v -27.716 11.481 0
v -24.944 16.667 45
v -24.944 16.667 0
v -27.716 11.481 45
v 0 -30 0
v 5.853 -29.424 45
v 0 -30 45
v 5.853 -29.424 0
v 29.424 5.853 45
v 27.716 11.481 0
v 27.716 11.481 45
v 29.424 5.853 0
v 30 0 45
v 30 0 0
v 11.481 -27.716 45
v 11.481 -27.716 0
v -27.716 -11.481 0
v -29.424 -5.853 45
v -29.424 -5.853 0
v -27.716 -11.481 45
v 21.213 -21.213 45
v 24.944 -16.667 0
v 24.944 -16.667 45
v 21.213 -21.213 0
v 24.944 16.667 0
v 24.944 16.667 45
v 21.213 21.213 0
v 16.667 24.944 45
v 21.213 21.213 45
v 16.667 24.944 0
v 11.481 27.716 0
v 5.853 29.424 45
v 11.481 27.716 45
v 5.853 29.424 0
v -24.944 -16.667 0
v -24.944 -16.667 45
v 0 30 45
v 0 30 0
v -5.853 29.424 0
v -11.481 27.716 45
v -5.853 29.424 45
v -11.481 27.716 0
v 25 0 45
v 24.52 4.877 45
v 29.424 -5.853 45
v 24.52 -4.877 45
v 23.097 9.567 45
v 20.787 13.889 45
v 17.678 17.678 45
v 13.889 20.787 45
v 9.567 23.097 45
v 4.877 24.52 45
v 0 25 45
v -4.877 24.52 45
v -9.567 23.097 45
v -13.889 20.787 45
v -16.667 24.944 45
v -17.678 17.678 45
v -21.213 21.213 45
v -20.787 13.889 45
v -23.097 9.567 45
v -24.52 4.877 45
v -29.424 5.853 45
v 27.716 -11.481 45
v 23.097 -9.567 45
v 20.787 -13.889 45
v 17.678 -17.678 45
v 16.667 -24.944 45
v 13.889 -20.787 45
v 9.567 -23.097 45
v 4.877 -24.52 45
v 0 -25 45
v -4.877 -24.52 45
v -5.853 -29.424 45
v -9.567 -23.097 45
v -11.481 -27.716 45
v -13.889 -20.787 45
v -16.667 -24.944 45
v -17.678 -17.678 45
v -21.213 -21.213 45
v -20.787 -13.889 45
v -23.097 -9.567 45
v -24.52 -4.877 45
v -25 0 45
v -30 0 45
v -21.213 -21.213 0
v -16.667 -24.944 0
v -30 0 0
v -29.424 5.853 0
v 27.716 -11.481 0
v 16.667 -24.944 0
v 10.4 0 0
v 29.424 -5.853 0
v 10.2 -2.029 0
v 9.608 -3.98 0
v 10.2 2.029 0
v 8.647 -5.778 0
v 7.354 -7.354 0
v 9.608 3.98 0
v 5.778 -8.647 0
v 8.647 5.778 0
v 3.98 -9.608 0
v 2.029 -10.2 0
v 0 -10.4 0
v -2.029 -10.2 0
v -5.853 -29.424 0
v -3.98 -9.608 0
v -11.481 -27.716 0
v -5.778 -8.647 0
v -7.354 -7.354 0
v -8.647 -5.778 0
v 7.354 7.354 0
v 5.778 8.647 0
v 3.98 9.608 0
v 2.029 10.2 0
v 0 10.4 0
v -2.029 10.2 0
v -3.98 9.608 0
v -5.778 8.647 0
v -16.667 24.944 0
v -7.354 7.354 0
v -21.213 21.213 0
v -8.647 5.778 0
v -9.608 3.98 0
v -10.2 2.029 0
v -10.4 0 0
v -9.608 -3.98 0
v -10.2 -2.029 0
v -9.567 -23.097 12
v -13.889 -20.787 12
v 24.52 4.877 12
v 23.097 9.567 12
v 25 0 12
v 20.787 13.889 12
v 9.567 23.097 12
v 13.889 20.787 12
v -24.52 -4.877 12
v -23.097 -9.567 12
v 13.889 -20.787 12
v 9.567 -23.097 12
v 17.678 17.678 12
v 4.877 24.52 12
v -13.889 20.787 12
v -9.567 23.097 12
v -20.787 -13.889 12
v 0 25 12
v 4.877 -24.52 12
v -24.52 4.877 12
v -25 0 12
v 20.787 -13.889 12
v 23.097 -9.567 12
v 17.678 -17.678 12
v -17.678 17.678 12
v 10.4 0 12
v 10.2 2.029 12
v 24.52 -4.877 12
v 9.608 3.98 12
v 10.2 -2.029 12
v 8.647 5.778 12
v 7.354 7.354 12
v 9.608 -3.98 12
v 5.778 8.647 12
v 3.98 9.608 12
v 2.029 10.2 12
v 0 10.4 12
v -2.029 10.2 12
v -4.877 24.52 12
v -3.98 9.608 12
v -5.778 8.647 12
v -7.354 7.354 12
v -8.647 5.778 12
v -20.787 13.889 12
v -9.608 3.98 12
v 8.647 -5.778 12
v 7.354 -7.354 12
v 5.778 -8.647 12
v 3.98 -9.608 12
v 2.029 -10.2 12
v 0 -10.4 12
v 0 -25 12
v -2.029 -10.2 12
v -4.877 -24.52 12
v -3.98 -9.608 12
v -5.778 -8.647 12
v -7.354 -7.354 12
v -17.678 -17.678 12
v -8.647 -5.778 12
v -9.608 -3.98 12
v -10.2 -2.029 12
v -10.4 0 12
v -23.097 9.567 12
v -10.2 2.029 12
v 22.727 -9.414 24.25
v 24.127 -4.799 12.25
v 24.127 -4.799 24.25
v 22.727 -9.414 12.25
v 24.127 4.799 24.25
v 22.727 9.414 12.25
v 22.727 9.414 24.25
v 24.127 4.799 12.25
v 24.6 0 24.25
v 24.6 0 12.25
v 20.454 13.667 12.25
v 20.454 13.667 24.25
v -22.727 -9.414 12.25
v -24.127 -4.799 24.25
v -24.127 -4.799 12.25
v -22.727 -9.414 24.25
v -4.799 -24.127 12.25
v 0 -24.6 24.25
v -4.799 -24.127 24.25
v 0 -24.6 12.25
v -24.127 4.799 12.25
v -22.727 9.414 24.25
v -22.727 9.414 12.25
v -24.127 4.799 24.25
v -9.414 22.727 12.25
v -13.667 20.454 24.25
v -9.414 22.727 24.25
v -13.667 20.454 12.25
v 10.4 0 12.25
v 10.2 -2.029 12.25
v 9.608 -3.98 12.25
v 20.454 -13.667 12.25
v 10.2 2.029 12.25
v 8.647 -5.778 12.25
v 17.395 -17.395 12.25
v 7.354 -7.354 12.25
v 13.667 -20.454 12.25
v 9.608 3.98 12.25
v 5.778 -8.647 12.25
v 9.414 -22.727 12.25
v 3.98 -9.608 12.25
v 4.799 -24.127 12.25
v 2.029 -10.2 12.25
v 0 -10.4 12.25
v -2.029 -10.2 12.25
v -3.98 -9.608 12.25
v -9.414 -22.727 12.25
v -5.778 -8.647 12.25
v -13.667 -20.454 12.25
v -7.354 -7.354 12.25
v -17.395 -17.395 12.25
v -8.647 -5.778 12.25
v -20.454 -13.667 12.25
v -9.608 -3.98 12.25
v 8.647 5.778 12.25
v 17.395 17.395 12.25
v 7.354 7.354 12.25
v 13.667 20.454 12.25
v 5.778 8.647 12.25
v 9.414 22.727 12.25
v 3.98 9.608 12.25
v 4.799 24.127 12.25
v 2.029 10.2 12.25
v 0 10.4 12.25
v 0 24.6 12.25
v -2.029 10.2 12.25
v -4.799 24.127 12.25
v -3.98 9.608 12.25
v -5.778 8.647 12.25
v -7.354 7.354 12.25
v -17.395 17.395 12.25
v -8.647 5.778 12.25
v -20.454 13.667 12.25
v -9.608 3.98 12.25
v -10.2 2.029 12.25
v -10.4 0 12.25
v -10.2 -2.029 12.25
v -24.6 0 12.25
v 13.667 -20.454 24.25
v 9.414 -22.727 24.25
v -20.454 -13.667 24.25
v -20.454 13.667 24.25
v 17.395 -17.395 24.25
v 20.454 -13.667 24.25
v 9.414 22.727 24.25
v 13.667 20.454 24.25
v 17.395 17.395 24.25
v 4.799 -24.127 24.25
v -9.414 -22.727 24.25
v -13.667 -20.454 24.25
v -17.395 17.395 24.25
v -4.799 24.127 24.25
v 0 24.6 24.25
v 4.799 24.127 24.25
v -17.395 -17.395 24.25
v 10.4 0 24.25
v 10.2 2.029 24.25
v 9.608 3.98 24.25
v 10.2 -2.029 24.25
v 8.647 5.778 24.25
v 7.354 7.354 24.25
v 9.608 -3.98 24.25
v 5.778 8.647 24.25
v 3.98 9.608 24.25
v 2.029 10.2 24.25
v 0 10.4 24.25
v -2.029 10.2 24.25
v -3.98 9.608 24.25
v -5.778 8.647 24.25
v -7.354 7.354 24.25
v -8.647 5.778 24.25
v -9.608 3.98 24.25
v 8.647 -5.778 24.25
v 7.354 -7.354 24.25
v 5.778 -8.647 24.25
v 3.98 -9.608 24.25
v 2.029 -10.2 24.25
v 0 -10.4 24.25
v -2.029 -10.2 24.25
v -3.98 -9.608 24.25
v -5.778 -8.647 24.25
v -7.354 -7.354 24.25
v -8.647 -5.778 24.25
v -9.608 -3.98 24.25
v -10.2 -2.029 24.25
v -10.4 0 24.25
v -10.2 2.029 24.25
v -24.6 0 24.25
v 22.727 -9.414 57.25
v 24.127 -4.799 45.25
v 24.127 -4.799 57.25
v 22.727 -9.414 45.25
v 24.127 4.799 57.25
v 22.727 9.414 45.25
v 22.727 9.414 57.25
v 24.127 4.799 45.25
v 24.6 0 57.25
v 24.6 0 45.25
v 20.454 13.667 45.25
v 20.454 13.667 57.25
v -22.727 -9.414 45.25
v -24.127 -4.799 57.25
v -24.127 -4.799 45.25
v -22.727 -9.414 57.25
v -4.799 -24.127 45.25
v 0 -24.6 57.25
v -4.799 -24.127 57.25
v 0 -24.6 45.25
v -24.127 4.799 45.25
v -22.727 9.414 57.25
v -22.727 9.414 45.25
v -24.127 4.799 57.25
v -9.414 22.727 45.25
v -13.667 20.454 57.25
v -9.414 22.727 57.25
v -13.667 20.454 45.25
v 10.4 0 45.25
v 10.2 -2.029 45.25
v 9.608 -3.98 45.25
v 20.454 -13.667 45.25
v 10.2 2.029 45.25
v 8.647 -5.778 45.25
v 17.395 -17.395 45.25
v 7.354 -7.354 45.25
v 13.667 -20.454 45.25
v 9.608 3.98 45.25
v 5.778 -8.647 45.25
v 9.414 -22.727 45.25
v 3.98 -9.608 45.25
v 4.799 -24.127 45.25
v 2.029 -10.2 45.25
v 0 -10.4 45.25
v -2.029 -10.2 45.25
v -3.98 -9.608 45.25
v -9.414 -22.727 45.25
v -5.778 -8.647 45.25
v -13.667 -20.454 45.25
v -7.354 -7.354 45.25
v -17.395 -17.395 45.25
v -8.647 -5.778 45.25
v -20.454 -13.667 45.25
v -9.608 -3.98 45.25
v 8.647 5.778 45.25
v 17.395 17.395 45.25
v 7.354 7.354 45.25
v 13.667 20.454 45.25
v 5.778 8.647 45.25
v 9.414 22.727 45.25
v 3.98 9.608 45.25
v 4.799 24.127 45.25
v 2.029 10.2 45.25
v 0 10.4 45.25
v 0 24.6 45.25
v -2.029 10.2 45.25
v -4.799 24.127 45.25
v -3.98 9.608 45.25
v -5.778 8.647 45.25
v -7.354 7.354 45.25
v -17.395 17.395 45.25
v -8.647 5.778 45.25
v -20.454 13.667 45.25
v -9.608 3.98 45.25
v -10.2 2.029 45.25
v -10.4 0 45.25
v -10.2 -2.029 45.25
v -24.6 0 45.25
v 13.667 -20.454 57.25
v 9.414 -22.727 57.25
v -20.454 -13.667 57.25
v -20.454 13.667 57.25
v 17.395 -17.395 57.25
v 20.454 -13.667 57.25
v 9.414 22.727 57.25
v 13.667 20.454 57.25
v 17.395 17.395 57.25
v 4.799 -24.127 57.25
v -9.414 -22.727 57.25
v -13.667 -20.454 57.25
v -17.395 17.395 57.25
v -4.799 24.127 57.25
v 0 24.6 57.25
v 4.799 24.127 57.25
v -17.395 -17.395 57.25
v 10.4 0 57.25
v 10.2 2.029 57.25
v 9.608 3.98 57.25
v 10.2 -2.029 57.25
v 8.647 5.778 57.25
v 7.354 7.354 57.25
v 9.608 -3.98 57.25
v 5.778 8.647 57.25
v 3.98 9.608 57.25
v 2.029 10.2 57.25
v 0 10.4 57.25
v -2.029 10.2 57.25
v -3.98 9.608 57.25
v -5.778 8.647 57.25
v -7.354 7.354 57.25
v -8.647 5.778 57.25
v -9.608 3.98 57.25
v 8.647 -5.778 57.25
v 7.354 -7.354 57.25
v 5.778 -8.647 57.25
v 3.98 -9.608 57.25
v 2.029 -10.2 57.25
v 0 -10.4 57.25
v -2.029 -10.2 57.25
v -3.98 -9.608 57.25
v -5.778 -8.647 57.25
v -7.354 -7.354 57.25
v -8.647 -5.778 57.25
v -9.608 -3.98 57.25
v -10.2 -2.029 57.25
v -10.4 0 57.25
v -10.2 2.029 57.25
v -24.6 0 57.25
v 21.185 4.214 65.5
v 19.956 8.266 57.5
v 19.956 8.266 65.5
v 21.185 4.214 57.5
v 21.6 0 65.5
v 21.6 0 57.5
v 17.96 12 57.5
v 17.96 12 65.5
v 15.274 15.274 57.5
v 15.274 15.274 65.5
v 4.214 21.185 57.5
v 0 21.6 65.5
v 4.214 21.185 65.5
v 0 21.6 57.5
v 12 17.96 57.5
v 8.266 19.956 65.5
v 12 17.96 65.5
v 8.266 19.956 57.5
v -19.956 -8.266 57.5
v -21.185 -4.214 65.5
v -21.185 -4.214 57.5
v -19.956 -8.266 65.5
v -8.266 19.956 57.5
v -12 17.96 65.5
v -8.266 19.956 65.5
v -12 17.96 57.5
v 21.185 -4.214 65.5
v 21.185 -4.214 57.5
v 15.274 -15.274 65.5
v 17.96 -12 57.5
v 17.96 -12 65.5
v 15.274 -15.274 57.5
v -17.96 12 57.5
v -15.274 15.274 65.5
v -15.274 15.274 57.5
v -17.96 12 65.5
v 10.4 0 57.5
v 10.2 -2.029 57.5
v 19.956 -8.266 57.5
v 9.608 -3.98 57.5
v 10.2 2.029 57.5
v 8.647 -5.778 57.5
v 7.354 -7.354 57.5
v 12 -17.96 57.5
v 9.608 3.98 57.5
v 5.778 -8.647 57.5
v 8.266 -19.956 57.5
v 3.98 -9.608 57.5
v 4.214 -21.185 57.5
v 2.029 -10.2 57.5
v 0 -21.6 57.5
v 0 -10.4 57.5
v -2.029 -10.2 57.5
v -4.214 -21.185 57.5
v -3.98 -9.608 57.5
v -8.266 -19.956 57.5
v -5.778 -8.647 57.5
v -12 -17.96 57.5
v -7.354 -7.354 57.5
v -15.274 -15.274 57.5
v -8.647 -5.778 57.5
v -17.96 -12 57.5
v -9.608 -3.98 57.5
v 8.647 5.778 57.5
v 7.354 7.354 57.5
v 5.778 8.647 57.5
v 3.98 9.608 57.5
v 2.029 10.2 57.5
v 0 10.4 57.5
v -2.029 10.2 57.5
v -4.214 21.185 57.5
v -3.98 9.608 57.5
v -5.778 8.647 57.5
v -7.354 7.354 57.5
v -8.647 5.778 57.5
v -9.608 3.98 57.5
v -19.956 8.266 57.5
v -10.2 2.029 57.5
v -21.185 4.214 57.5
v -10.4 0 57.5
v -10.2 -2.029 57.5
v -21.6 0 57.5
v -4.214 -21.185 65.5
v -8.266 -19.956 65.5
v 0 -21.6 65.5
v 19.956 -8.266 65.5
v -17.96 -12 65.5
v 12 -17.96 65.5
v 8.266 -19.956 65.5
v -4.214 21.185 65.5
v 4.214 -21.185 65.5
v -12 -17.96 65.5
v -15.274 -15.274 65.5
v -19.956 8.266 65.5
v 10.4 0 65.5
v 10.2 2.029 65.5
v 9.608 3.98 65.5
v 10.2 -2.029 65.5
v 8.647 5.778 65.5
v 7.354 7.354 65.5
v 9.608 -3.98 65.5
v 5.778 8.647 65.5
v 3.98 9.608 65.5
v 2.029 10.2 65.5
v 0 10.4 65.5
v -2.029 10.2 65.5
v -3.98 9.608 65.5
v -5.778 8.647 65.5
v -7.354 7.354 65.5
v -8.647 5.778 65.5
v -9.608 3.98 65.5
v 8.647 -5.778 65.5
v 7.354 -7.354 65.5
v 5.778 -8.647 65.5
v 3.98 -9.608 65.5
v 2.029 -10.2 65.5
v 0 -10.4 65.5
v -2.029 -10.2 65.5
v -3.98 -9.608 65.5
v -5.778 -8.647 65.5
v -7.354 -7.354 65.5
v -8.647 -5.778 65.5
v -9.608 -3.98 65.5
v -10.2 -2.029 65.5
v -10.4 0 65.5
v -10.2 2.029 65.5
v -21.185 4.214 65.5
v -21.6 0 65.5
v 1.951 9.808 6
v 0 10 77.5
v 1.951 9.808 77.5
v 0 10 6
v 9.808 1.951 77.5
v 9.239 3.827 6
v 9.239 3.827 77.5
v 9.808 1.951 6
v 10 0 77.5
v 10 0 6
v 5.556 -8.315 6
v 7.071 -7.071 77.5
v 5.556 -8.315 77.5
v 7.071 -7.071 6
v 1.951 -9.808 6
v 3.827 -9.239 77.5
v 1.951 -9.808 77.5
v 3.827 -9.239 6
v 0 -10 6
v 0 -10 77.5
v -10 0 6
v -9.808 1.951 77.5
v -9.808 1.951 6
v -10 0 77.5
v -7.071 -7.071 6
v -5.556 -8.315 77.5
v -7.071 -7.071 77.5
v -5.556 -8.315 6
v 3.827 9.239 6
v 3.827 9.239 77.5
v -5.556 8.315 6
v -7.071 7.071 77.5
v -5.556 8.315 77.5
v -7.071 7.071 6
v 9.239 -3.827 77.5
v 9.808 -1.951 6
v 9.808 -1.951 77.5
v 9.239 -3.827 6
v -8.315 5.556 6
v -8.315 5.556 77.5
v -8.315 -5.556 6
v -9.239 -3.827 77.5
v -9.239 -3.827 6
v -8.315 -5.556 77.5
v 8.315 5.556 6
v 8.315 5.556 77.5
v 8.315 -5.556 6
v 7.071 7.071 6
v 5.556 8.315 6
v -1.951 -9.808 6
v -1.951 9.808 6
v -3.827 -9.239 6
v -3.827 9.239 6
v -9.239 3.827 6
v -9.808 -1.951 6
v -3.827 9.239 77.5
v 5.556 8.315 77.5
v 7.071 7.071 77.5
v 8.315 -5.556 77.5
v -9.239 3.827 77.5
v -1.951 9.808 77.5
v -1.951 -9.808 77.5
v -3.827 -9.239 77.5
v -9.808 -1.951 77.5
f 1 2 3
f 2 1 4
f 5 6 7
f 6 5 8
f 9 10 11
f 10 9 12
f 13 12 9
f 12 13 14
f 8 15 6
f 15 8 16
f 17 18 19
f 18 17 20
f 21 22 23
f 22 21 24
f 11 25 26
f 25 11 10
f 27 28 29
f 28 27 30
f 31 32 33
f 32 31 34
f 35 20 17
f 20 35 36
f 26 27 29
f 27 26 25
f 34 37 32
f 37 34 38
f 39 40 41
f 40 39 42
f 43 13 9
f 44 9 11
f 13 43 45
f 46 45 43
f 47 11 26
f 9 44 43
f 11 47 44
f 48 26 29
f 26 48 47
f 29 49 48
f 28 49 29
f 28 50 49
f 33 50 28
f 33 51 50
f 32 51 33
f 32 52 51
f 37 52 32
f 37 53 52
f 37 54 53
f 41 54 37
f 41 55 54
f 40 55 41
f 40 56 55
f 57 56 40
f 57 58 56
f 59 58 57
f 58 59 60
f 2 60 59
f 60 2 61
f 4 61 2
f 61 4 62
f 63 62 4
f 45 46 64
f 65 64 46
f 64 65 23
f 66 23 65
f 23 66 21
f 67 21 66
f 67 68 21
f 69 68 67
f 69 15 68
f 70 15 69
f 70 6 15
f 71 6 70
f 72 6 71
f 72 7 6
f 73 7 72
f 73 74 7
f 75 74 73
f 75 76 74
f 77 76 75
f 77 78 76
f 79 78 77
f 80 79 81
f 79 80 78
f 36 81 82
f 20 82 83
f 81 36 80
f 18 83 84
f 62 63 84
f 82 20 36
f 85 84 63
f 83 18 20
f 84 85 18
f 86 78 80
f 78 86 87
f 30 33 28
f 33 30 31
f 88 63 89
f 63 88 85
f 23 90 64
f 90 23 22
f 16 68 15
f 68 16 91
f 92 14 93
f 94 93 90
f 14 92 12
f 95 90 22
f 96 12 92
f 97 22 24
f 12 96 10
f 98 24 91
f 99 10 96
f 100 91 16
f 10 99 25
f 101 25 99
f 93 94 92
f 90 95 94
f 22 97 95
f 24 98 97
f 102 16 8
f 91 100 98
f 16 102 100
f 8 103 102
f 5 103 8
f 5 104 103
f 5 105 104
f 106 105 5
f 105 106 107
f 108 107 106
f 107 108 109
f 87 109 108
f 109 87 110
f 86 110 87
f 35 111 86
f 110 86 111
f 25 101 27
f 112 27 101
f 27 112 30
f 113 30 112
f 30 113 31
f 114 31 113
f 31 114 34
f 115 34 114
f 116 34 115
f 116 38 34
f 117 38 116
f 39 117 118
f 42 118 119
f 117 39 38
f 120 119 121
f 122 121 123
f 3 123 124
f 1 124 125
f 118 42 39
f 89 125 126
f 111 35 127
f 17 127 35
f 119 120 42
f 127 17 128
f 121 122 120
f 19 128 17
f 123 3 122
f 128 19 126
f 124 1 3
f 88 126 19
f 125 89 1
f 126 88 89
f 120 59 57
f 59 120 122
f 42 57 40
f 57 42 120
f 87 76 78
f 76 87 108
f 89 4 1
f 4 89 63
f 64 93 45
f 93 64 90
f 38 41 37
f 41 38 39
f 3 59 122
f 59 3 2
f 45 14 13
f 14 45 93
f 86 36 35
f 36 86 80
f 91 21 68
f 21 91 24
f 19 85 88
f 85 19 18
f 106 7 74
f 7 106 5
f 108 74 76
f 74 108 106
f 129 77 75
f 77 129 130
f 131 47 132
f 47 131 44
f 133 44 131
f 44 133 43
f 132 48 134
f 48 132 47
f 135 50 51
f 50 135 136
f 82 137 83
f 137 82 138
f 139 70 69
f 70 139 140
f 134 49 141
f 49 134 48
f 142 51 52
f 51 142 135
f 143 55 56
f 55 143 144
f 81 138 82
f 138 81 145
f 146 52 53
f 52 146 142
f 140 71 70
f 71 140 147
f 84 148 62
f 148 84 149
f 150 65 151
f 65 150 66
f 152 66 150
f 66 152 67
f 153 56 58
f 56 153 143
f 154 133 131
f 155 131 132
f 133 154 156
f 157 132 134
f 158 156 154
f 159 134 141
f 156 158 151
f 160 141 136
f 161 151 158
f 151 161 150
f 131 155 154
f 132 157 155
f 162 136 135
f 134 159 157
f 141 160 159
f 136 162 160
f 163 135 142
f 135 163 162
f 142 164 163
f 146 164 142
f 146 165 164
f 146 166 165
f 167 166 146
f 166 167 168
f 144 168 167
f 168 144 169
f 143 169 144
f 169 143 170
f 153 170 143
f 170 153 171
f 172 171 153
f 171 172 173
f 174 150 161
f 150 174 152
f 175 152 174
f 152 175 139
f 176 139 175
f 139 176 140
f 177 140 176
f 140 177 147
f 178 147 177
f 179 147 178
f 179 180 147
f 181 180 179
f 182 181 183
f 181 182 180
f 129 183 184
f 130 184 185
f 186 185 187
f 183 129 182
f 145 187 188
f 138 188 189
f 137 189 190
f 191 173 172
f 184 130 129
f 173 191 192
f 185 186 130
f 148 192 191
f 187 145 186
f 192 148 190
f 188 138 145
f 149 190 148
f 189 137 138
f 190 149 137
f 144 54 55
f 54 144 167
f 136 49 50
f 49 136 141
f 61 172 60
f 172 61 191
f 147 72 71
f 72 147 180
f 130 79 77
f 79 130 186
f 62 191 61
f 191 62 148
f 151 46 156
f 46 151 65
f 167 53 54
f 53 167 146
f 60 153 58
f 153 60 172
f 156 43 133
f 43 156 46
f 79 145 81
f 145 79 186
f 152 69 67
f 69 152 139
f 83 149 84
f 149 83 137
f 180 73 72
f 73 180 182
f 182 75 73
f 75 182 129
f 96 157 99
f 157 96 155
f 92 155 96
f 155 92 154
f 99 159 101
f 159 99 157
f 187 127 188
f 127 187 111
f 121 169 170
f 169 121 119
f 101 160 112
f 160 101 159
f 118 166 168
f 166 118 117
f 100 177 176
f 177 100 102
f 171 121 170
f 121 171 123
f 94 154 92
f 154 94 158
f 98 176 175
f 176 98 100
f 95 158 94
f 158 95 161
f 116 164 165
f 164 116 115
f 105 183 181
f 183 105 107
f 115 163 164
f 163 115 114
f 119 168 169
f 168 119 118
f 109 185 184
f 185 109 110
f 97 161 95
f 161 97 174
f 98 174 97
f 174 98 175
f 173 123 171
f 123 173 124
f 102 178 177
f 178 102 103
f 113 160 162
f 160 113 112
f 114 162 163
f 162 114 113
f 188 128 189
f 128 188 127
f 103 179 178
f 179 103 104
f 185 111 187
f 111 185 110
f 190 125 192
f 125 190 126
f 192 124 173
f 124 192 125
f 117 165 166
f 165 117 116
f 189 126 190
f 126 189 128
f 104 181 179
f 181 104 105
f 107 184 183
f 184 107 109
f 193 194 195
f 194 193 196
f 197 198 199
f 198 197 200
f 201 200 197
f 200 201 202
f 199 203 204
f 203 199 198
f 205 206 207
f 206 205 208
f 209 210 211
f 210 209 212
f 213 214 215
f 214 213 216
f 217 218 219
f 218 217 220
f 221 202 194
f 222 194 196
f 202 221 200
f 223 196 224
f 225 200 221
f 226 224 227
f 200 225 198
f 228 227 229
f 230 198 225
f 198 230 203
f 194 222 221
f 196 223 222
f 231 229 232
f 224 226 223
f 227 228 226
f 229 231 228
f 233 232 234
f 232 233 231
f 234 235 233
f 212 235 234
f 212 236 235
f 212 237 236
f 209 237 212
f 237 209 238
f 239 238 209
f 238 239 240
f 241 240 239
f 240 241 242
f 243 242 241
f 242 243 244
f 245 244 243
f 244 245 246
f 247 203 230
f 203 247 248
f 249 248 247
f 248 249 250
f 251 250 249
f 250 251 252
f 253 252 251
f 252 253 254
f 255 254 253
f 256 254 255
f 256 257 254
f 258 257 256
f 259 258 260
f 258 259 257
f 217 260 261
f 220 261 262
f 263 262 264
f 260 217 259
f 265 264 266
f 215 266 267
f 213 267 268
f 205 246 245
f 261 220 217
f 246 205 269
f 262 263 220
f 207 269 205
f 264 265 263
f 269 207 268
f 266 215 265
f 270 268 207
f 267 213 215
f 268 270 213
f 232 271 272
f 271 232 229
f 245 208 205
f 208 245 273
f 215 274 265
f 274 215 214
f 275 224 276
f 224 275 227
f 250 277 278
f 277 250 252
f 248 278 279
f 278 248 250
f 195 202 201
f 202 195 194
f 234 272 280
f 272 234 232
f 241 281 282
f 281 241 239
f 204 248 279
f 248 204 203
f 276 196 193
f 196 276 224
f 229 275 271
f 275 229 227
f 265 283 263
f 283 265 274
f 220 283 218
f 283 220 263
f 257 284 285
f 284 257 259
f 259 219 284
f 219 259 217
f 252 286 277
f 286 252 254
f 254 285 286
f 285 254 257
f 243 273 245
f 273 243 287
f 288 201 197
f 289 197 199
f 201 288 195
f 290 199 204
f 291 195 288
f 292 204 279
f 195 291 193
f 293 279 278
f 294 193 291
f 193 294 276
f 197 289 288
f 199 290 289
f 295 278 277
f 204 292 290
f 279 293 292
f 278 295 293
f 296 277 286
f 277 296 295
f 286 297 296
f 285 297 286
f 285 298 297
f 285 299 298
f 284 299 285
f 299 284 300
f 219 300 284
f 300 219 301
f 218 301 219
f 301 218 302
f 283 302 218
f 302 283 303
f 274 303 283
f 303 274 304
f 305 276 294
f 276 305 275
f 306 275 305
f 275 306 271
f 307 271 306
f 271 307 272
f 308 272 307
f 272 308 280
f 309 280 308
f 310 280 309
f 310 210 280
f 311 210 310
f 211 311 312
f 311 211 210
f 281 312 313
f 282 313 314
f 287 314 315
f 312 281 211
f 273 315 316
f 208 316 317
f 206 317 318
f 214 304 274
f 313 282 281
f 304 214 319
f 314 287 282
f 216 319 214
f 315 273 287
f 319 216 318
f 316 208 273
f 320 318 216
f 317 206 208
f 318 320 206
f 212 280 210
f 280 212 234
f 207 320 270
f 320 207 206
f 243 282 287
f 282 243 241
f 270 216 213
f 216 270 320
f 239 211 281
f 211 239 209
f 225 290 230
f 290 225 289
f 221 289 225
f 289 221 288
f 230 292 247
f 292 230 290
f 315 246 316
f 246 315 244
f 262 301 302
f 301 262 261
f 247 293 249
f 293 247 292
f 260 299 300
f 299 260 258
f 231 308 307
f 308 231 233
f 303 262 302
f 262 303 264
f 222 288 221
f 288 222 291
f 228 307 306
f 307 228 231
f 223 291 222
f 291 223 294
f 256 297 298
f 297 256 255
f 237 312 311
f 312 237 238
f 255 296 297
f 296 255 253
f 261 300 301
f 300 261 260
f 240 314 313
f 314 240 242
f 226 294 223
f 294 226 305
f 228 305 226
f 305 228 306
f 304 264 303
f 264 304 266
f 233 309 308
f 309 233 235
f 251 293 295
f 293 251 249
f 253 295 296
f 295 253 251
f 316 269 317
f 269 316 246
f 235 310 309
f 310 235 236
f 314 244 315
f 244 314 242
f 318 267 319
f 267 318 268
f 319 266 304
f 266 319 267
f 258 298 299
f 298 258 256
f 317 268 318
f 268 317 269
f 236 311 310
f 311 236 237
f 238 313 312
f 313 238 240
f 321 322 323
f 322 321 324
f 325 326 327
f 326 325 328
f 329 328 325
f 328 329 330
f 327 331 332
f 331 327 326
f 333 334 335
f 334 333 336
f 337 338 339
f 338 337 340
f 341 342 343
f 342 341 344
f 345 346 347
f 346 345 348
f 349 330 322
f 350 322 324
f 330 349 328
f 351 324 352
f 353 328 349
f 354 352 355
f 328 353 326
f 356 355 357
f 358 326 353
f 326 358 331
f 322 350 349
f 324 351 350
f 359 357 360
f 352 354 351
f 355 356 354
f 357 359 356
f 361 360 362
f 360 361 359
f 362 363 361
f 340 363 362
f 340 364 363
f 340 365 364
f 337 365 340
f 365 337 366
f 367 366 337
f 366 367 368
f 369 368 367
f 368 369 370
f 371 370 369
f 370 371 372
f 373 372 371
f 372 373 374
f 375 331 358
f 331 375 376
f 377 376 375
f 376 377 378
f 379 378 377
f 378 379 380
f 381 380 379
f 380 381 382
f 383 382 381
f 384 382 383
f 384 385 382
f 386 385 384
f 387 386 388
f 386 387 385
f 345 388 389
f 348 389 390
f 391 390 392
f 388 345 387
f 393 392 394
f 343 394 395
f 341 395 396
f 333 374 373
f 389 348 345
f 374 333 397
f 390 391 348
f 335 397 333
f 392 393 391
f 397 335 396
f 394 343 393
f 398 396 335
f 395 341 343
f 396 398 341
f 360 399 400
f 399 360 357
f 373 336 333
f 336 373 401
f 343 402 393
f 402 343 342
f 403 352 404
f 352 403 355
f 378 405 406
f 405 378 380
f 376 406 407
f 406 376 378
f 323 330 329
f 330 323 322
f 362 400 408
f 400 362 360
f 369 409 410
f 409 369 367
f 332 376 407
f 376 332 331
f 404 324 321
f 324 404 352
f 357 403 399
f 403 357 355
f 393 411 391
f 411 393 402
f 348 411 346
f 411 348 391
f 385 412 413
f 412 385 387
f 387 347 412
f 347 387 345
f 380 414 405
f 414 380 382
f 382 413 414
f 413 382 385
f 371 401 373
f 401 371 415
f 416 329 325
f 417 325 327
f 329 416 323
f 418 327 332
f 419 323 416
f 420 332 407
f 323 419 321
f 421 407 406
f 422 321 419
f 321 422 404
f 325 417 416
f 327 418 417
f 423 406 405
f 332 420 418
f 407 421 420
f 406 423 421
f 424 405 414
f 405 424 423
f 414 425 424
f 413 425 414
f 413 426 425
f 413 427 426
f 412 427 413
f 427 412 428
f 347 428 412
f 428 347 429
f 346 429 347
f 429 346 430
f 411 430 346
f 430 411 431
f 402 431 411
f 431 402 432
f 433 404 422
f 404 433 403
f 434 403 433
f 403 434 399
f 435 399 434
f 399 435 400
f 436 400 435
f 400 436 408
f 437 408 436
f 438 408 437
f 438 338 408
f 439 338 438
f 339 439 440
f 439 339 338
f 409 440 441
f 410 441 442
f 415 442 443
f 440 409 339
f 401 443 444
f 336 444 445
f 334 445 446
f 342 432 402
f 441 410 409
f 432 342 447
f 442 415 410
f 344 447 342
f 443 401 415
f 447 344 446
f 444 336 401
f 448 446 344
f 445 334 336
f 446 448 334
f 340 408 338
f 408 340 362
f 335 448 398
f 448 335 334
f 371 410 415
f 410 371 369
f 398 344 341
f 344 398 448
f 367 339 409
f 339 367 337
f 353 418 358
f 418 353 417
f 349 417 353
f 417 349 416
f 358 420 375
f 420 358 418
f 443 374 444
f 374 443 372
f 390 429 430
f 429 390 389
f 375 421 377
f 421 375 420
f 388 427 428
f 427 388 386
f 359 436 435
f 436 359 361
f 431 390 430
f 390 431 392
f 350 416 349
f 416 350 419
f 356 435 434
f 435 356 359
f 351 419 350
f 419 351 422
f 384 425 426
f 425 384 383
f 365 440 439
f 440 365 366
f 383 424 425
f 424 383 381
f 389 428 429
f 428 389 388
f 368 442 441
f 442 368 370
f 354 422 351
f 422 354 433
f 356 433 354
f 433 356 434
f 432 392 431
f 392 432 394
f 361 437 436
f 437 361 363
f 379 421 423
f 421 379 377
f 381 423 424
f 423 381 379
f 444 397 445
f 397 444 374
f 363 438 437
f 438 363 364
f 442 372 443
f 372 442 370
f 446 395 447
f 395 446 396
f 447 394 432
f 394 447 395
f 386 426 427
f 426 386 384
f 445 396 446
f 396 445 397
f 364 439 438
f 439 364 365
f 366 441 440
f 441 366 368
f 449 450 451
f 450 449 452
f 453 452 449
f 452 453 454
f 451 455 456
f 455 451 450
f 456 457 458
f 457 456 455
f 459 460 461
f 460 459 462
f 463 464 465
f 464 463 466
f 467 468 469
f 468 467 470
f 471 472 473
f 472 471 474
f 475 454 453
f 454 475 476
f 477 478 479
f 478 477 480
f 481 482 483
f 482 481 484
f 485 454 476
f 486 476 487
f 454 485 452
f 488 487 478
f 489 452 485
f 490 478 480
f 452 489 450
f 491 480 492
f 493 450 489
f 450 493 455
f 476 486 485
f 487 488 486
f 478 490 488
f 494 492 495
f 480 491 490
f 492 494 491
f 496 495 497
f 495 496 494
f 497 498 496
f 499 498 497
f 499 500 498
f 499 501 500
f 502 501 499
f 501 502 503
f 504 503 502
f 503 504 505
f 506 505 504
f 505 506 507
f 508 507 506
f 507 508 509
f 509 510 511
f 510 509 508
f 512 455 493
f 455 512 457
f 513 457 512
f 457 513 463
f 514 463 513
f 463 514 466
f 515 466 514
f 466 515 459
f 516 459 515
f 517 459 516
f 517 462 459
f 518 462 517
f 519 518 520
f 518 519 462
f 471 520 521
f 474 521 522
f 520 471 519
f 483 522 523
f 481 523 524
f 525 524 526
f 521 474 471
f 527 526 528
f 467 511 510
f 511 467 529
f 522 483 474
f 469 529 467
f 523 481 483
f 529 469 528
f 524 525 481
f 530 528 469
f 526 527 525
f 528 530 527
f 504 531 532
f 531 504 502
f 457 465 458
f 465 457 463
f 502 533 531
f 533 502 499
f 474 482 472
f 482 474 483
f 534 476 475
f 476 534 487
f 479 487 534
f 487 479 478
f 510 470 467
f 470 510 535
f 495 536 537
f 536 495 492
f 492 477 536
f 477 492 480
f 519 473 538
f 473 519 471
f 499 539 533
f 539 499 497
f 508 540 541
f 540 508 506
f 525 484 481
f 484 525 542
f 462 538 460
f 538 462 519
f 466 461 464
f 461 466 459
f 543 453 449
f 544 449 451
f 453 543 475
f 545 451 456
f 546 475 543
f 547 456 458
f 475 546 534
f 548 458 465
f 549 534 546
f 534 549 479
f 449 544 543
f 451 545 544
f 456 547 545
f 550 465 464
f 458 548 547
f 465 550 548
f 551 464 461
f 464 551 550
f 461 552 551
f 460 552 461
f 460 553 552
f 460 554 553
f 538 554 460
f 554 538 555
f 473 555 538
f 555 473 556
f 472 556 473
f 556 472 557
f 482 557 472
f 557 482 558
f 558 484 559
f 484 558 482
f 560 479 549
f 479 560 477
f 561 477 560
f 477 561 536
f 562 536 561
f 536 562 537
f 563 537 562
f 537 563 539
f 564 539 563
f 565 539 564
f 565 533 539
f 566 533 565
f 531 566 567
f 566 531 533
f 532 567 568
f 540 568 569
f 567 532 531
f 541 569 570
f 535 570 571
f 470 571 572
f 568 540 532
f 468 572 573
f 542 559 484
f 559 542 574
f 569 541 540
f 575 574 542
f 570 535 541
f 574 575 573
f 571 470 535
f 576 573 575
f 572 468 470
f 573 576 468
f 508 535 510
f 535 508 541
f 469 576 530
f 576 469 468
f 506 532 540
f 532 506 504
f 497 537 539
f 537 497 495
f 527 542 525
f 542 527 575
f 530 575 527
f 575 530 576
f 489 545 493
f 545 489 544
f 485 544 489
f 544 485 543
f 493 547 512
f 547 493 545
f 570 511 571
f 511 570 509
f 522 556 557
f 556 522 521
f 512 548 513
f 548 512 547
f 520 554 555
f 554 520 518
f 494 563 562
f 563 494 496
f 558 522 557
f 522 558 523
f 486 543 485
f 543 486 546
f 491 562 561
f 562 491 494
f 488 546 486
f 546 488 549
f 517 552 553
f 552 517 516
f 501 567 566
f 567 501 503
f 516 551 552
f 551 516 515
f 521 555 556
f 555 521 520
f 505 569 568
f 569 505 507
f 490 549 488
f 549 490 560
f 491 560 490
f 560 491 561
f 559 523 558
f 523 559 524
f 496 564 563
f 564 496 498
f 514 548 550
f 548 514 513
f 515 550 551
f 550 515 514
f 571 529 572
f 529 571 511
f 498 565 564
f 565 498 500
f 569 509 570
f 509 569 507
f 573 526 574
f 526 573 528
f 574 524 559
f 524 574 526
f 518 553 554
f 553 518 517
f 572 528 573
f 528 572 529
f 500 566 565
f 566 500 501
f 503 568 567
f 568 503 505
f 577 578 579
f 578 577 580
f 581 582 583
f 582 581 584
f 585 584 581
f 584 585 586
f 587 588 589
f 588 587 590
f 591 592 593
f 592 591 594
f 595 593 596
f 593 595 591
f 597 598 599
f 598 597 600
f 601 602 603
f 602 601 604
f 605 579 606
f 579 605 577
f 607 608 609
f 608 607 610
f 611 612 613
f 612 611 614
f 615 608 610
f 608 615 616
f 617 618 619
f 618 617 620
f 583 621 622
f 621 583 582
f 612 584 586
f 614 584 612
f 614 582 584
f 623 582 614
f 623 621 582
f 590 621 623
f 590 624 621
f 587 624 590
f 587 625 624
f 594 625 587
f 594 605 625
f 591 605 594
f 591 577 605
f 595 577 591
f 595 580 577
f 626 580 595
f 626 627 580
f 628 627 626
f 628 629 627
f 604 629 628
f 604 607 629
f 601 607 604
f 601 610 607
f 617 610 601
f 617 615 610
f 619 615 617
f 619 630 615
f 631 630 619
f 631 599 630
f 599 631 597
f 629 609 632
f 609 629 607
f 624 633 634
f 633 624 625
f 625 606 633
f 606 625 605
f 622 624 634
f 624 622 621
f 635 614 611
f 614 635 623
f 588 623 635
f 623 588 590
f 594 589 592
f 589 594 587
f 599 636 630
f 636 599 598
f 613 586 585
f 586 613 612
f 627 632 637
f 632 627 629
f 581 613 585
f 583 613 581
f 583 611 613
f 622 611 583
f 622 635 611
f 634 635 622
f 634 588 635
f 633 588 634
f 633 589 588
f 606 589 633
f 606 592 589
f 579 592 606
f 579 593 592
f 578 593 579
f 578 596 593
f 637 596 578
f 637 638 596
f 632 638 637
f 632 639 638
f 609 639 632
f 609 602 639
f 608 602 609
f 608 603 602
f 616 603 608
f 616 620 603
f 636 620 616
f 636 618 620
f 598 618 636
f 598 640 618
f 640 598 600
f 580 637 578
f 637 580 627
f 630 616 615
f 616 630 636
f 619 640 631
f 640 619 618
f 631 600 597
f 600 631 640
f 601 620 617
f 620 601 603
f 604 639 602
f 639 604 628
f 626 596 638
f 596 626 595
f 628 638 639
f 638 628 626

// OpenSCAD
$fn = 32;

// ------------------------------------------------------------------------
// Bearing housing: housing d60, two bearings and a shaft
// Every part is its own module, assembly() places them once.
// ------------------------------------------------------------------------

// --- part 1 ---
module housing() {
  difference() {
    cylinder(h = 45, d = 60);
    translate([0, 0, 12]) cylinder(h = 34, d = 50);
    translate([0, 0, -1]) cylinder(h = 14, d = 20.8);
  }
}

// --- part 2 ---
module bearing_lower() {
  difference() {
      translate([0, 0, 0]) cylinder(h = 12, d = 49.2);
      translate([0, 0, -1]) cylinder(h = 14, d = 20.8);
    }
}

// --- part 3 ---
module bearing_upper() {
  difference() {
      translate([0, 0, 0]) cylinder(h = 12, d = 49.2);
      translate([0, 0, -1]) cylinder(h = 14, d = 20.8);
    }
}

// --- part 4 ---
module spacer() {
  difference() {
      translate([0, 0, 0]) cylinder(h = 8, d = 43.2);
      translate([0, 0, -1]) cylinder(h = 10, d = 20.8);
    }
}

// --- part 5 ---
module shaft() {
  translate([0, 0, -35.75]) cylinder(h = 71.5, d = 20);
}

// --- assembly ---
module assembly() {
  translate([0, 0, 0]) rotate([0, 0, 0]) housing();
  translate([0, 0, 12.25]) rotate([0, 0, 0]) bearing_lower();
  translate([0, 0, 45.25]) rotate([0, 0, 0]) bearing_upper();
  translate([0, 0, 57.5]) rotate([0, 0, 0]) spacer();
  translate([0, 0, 41.75]) rotate([0, 0, 0]) shaft();
}

assembly();
